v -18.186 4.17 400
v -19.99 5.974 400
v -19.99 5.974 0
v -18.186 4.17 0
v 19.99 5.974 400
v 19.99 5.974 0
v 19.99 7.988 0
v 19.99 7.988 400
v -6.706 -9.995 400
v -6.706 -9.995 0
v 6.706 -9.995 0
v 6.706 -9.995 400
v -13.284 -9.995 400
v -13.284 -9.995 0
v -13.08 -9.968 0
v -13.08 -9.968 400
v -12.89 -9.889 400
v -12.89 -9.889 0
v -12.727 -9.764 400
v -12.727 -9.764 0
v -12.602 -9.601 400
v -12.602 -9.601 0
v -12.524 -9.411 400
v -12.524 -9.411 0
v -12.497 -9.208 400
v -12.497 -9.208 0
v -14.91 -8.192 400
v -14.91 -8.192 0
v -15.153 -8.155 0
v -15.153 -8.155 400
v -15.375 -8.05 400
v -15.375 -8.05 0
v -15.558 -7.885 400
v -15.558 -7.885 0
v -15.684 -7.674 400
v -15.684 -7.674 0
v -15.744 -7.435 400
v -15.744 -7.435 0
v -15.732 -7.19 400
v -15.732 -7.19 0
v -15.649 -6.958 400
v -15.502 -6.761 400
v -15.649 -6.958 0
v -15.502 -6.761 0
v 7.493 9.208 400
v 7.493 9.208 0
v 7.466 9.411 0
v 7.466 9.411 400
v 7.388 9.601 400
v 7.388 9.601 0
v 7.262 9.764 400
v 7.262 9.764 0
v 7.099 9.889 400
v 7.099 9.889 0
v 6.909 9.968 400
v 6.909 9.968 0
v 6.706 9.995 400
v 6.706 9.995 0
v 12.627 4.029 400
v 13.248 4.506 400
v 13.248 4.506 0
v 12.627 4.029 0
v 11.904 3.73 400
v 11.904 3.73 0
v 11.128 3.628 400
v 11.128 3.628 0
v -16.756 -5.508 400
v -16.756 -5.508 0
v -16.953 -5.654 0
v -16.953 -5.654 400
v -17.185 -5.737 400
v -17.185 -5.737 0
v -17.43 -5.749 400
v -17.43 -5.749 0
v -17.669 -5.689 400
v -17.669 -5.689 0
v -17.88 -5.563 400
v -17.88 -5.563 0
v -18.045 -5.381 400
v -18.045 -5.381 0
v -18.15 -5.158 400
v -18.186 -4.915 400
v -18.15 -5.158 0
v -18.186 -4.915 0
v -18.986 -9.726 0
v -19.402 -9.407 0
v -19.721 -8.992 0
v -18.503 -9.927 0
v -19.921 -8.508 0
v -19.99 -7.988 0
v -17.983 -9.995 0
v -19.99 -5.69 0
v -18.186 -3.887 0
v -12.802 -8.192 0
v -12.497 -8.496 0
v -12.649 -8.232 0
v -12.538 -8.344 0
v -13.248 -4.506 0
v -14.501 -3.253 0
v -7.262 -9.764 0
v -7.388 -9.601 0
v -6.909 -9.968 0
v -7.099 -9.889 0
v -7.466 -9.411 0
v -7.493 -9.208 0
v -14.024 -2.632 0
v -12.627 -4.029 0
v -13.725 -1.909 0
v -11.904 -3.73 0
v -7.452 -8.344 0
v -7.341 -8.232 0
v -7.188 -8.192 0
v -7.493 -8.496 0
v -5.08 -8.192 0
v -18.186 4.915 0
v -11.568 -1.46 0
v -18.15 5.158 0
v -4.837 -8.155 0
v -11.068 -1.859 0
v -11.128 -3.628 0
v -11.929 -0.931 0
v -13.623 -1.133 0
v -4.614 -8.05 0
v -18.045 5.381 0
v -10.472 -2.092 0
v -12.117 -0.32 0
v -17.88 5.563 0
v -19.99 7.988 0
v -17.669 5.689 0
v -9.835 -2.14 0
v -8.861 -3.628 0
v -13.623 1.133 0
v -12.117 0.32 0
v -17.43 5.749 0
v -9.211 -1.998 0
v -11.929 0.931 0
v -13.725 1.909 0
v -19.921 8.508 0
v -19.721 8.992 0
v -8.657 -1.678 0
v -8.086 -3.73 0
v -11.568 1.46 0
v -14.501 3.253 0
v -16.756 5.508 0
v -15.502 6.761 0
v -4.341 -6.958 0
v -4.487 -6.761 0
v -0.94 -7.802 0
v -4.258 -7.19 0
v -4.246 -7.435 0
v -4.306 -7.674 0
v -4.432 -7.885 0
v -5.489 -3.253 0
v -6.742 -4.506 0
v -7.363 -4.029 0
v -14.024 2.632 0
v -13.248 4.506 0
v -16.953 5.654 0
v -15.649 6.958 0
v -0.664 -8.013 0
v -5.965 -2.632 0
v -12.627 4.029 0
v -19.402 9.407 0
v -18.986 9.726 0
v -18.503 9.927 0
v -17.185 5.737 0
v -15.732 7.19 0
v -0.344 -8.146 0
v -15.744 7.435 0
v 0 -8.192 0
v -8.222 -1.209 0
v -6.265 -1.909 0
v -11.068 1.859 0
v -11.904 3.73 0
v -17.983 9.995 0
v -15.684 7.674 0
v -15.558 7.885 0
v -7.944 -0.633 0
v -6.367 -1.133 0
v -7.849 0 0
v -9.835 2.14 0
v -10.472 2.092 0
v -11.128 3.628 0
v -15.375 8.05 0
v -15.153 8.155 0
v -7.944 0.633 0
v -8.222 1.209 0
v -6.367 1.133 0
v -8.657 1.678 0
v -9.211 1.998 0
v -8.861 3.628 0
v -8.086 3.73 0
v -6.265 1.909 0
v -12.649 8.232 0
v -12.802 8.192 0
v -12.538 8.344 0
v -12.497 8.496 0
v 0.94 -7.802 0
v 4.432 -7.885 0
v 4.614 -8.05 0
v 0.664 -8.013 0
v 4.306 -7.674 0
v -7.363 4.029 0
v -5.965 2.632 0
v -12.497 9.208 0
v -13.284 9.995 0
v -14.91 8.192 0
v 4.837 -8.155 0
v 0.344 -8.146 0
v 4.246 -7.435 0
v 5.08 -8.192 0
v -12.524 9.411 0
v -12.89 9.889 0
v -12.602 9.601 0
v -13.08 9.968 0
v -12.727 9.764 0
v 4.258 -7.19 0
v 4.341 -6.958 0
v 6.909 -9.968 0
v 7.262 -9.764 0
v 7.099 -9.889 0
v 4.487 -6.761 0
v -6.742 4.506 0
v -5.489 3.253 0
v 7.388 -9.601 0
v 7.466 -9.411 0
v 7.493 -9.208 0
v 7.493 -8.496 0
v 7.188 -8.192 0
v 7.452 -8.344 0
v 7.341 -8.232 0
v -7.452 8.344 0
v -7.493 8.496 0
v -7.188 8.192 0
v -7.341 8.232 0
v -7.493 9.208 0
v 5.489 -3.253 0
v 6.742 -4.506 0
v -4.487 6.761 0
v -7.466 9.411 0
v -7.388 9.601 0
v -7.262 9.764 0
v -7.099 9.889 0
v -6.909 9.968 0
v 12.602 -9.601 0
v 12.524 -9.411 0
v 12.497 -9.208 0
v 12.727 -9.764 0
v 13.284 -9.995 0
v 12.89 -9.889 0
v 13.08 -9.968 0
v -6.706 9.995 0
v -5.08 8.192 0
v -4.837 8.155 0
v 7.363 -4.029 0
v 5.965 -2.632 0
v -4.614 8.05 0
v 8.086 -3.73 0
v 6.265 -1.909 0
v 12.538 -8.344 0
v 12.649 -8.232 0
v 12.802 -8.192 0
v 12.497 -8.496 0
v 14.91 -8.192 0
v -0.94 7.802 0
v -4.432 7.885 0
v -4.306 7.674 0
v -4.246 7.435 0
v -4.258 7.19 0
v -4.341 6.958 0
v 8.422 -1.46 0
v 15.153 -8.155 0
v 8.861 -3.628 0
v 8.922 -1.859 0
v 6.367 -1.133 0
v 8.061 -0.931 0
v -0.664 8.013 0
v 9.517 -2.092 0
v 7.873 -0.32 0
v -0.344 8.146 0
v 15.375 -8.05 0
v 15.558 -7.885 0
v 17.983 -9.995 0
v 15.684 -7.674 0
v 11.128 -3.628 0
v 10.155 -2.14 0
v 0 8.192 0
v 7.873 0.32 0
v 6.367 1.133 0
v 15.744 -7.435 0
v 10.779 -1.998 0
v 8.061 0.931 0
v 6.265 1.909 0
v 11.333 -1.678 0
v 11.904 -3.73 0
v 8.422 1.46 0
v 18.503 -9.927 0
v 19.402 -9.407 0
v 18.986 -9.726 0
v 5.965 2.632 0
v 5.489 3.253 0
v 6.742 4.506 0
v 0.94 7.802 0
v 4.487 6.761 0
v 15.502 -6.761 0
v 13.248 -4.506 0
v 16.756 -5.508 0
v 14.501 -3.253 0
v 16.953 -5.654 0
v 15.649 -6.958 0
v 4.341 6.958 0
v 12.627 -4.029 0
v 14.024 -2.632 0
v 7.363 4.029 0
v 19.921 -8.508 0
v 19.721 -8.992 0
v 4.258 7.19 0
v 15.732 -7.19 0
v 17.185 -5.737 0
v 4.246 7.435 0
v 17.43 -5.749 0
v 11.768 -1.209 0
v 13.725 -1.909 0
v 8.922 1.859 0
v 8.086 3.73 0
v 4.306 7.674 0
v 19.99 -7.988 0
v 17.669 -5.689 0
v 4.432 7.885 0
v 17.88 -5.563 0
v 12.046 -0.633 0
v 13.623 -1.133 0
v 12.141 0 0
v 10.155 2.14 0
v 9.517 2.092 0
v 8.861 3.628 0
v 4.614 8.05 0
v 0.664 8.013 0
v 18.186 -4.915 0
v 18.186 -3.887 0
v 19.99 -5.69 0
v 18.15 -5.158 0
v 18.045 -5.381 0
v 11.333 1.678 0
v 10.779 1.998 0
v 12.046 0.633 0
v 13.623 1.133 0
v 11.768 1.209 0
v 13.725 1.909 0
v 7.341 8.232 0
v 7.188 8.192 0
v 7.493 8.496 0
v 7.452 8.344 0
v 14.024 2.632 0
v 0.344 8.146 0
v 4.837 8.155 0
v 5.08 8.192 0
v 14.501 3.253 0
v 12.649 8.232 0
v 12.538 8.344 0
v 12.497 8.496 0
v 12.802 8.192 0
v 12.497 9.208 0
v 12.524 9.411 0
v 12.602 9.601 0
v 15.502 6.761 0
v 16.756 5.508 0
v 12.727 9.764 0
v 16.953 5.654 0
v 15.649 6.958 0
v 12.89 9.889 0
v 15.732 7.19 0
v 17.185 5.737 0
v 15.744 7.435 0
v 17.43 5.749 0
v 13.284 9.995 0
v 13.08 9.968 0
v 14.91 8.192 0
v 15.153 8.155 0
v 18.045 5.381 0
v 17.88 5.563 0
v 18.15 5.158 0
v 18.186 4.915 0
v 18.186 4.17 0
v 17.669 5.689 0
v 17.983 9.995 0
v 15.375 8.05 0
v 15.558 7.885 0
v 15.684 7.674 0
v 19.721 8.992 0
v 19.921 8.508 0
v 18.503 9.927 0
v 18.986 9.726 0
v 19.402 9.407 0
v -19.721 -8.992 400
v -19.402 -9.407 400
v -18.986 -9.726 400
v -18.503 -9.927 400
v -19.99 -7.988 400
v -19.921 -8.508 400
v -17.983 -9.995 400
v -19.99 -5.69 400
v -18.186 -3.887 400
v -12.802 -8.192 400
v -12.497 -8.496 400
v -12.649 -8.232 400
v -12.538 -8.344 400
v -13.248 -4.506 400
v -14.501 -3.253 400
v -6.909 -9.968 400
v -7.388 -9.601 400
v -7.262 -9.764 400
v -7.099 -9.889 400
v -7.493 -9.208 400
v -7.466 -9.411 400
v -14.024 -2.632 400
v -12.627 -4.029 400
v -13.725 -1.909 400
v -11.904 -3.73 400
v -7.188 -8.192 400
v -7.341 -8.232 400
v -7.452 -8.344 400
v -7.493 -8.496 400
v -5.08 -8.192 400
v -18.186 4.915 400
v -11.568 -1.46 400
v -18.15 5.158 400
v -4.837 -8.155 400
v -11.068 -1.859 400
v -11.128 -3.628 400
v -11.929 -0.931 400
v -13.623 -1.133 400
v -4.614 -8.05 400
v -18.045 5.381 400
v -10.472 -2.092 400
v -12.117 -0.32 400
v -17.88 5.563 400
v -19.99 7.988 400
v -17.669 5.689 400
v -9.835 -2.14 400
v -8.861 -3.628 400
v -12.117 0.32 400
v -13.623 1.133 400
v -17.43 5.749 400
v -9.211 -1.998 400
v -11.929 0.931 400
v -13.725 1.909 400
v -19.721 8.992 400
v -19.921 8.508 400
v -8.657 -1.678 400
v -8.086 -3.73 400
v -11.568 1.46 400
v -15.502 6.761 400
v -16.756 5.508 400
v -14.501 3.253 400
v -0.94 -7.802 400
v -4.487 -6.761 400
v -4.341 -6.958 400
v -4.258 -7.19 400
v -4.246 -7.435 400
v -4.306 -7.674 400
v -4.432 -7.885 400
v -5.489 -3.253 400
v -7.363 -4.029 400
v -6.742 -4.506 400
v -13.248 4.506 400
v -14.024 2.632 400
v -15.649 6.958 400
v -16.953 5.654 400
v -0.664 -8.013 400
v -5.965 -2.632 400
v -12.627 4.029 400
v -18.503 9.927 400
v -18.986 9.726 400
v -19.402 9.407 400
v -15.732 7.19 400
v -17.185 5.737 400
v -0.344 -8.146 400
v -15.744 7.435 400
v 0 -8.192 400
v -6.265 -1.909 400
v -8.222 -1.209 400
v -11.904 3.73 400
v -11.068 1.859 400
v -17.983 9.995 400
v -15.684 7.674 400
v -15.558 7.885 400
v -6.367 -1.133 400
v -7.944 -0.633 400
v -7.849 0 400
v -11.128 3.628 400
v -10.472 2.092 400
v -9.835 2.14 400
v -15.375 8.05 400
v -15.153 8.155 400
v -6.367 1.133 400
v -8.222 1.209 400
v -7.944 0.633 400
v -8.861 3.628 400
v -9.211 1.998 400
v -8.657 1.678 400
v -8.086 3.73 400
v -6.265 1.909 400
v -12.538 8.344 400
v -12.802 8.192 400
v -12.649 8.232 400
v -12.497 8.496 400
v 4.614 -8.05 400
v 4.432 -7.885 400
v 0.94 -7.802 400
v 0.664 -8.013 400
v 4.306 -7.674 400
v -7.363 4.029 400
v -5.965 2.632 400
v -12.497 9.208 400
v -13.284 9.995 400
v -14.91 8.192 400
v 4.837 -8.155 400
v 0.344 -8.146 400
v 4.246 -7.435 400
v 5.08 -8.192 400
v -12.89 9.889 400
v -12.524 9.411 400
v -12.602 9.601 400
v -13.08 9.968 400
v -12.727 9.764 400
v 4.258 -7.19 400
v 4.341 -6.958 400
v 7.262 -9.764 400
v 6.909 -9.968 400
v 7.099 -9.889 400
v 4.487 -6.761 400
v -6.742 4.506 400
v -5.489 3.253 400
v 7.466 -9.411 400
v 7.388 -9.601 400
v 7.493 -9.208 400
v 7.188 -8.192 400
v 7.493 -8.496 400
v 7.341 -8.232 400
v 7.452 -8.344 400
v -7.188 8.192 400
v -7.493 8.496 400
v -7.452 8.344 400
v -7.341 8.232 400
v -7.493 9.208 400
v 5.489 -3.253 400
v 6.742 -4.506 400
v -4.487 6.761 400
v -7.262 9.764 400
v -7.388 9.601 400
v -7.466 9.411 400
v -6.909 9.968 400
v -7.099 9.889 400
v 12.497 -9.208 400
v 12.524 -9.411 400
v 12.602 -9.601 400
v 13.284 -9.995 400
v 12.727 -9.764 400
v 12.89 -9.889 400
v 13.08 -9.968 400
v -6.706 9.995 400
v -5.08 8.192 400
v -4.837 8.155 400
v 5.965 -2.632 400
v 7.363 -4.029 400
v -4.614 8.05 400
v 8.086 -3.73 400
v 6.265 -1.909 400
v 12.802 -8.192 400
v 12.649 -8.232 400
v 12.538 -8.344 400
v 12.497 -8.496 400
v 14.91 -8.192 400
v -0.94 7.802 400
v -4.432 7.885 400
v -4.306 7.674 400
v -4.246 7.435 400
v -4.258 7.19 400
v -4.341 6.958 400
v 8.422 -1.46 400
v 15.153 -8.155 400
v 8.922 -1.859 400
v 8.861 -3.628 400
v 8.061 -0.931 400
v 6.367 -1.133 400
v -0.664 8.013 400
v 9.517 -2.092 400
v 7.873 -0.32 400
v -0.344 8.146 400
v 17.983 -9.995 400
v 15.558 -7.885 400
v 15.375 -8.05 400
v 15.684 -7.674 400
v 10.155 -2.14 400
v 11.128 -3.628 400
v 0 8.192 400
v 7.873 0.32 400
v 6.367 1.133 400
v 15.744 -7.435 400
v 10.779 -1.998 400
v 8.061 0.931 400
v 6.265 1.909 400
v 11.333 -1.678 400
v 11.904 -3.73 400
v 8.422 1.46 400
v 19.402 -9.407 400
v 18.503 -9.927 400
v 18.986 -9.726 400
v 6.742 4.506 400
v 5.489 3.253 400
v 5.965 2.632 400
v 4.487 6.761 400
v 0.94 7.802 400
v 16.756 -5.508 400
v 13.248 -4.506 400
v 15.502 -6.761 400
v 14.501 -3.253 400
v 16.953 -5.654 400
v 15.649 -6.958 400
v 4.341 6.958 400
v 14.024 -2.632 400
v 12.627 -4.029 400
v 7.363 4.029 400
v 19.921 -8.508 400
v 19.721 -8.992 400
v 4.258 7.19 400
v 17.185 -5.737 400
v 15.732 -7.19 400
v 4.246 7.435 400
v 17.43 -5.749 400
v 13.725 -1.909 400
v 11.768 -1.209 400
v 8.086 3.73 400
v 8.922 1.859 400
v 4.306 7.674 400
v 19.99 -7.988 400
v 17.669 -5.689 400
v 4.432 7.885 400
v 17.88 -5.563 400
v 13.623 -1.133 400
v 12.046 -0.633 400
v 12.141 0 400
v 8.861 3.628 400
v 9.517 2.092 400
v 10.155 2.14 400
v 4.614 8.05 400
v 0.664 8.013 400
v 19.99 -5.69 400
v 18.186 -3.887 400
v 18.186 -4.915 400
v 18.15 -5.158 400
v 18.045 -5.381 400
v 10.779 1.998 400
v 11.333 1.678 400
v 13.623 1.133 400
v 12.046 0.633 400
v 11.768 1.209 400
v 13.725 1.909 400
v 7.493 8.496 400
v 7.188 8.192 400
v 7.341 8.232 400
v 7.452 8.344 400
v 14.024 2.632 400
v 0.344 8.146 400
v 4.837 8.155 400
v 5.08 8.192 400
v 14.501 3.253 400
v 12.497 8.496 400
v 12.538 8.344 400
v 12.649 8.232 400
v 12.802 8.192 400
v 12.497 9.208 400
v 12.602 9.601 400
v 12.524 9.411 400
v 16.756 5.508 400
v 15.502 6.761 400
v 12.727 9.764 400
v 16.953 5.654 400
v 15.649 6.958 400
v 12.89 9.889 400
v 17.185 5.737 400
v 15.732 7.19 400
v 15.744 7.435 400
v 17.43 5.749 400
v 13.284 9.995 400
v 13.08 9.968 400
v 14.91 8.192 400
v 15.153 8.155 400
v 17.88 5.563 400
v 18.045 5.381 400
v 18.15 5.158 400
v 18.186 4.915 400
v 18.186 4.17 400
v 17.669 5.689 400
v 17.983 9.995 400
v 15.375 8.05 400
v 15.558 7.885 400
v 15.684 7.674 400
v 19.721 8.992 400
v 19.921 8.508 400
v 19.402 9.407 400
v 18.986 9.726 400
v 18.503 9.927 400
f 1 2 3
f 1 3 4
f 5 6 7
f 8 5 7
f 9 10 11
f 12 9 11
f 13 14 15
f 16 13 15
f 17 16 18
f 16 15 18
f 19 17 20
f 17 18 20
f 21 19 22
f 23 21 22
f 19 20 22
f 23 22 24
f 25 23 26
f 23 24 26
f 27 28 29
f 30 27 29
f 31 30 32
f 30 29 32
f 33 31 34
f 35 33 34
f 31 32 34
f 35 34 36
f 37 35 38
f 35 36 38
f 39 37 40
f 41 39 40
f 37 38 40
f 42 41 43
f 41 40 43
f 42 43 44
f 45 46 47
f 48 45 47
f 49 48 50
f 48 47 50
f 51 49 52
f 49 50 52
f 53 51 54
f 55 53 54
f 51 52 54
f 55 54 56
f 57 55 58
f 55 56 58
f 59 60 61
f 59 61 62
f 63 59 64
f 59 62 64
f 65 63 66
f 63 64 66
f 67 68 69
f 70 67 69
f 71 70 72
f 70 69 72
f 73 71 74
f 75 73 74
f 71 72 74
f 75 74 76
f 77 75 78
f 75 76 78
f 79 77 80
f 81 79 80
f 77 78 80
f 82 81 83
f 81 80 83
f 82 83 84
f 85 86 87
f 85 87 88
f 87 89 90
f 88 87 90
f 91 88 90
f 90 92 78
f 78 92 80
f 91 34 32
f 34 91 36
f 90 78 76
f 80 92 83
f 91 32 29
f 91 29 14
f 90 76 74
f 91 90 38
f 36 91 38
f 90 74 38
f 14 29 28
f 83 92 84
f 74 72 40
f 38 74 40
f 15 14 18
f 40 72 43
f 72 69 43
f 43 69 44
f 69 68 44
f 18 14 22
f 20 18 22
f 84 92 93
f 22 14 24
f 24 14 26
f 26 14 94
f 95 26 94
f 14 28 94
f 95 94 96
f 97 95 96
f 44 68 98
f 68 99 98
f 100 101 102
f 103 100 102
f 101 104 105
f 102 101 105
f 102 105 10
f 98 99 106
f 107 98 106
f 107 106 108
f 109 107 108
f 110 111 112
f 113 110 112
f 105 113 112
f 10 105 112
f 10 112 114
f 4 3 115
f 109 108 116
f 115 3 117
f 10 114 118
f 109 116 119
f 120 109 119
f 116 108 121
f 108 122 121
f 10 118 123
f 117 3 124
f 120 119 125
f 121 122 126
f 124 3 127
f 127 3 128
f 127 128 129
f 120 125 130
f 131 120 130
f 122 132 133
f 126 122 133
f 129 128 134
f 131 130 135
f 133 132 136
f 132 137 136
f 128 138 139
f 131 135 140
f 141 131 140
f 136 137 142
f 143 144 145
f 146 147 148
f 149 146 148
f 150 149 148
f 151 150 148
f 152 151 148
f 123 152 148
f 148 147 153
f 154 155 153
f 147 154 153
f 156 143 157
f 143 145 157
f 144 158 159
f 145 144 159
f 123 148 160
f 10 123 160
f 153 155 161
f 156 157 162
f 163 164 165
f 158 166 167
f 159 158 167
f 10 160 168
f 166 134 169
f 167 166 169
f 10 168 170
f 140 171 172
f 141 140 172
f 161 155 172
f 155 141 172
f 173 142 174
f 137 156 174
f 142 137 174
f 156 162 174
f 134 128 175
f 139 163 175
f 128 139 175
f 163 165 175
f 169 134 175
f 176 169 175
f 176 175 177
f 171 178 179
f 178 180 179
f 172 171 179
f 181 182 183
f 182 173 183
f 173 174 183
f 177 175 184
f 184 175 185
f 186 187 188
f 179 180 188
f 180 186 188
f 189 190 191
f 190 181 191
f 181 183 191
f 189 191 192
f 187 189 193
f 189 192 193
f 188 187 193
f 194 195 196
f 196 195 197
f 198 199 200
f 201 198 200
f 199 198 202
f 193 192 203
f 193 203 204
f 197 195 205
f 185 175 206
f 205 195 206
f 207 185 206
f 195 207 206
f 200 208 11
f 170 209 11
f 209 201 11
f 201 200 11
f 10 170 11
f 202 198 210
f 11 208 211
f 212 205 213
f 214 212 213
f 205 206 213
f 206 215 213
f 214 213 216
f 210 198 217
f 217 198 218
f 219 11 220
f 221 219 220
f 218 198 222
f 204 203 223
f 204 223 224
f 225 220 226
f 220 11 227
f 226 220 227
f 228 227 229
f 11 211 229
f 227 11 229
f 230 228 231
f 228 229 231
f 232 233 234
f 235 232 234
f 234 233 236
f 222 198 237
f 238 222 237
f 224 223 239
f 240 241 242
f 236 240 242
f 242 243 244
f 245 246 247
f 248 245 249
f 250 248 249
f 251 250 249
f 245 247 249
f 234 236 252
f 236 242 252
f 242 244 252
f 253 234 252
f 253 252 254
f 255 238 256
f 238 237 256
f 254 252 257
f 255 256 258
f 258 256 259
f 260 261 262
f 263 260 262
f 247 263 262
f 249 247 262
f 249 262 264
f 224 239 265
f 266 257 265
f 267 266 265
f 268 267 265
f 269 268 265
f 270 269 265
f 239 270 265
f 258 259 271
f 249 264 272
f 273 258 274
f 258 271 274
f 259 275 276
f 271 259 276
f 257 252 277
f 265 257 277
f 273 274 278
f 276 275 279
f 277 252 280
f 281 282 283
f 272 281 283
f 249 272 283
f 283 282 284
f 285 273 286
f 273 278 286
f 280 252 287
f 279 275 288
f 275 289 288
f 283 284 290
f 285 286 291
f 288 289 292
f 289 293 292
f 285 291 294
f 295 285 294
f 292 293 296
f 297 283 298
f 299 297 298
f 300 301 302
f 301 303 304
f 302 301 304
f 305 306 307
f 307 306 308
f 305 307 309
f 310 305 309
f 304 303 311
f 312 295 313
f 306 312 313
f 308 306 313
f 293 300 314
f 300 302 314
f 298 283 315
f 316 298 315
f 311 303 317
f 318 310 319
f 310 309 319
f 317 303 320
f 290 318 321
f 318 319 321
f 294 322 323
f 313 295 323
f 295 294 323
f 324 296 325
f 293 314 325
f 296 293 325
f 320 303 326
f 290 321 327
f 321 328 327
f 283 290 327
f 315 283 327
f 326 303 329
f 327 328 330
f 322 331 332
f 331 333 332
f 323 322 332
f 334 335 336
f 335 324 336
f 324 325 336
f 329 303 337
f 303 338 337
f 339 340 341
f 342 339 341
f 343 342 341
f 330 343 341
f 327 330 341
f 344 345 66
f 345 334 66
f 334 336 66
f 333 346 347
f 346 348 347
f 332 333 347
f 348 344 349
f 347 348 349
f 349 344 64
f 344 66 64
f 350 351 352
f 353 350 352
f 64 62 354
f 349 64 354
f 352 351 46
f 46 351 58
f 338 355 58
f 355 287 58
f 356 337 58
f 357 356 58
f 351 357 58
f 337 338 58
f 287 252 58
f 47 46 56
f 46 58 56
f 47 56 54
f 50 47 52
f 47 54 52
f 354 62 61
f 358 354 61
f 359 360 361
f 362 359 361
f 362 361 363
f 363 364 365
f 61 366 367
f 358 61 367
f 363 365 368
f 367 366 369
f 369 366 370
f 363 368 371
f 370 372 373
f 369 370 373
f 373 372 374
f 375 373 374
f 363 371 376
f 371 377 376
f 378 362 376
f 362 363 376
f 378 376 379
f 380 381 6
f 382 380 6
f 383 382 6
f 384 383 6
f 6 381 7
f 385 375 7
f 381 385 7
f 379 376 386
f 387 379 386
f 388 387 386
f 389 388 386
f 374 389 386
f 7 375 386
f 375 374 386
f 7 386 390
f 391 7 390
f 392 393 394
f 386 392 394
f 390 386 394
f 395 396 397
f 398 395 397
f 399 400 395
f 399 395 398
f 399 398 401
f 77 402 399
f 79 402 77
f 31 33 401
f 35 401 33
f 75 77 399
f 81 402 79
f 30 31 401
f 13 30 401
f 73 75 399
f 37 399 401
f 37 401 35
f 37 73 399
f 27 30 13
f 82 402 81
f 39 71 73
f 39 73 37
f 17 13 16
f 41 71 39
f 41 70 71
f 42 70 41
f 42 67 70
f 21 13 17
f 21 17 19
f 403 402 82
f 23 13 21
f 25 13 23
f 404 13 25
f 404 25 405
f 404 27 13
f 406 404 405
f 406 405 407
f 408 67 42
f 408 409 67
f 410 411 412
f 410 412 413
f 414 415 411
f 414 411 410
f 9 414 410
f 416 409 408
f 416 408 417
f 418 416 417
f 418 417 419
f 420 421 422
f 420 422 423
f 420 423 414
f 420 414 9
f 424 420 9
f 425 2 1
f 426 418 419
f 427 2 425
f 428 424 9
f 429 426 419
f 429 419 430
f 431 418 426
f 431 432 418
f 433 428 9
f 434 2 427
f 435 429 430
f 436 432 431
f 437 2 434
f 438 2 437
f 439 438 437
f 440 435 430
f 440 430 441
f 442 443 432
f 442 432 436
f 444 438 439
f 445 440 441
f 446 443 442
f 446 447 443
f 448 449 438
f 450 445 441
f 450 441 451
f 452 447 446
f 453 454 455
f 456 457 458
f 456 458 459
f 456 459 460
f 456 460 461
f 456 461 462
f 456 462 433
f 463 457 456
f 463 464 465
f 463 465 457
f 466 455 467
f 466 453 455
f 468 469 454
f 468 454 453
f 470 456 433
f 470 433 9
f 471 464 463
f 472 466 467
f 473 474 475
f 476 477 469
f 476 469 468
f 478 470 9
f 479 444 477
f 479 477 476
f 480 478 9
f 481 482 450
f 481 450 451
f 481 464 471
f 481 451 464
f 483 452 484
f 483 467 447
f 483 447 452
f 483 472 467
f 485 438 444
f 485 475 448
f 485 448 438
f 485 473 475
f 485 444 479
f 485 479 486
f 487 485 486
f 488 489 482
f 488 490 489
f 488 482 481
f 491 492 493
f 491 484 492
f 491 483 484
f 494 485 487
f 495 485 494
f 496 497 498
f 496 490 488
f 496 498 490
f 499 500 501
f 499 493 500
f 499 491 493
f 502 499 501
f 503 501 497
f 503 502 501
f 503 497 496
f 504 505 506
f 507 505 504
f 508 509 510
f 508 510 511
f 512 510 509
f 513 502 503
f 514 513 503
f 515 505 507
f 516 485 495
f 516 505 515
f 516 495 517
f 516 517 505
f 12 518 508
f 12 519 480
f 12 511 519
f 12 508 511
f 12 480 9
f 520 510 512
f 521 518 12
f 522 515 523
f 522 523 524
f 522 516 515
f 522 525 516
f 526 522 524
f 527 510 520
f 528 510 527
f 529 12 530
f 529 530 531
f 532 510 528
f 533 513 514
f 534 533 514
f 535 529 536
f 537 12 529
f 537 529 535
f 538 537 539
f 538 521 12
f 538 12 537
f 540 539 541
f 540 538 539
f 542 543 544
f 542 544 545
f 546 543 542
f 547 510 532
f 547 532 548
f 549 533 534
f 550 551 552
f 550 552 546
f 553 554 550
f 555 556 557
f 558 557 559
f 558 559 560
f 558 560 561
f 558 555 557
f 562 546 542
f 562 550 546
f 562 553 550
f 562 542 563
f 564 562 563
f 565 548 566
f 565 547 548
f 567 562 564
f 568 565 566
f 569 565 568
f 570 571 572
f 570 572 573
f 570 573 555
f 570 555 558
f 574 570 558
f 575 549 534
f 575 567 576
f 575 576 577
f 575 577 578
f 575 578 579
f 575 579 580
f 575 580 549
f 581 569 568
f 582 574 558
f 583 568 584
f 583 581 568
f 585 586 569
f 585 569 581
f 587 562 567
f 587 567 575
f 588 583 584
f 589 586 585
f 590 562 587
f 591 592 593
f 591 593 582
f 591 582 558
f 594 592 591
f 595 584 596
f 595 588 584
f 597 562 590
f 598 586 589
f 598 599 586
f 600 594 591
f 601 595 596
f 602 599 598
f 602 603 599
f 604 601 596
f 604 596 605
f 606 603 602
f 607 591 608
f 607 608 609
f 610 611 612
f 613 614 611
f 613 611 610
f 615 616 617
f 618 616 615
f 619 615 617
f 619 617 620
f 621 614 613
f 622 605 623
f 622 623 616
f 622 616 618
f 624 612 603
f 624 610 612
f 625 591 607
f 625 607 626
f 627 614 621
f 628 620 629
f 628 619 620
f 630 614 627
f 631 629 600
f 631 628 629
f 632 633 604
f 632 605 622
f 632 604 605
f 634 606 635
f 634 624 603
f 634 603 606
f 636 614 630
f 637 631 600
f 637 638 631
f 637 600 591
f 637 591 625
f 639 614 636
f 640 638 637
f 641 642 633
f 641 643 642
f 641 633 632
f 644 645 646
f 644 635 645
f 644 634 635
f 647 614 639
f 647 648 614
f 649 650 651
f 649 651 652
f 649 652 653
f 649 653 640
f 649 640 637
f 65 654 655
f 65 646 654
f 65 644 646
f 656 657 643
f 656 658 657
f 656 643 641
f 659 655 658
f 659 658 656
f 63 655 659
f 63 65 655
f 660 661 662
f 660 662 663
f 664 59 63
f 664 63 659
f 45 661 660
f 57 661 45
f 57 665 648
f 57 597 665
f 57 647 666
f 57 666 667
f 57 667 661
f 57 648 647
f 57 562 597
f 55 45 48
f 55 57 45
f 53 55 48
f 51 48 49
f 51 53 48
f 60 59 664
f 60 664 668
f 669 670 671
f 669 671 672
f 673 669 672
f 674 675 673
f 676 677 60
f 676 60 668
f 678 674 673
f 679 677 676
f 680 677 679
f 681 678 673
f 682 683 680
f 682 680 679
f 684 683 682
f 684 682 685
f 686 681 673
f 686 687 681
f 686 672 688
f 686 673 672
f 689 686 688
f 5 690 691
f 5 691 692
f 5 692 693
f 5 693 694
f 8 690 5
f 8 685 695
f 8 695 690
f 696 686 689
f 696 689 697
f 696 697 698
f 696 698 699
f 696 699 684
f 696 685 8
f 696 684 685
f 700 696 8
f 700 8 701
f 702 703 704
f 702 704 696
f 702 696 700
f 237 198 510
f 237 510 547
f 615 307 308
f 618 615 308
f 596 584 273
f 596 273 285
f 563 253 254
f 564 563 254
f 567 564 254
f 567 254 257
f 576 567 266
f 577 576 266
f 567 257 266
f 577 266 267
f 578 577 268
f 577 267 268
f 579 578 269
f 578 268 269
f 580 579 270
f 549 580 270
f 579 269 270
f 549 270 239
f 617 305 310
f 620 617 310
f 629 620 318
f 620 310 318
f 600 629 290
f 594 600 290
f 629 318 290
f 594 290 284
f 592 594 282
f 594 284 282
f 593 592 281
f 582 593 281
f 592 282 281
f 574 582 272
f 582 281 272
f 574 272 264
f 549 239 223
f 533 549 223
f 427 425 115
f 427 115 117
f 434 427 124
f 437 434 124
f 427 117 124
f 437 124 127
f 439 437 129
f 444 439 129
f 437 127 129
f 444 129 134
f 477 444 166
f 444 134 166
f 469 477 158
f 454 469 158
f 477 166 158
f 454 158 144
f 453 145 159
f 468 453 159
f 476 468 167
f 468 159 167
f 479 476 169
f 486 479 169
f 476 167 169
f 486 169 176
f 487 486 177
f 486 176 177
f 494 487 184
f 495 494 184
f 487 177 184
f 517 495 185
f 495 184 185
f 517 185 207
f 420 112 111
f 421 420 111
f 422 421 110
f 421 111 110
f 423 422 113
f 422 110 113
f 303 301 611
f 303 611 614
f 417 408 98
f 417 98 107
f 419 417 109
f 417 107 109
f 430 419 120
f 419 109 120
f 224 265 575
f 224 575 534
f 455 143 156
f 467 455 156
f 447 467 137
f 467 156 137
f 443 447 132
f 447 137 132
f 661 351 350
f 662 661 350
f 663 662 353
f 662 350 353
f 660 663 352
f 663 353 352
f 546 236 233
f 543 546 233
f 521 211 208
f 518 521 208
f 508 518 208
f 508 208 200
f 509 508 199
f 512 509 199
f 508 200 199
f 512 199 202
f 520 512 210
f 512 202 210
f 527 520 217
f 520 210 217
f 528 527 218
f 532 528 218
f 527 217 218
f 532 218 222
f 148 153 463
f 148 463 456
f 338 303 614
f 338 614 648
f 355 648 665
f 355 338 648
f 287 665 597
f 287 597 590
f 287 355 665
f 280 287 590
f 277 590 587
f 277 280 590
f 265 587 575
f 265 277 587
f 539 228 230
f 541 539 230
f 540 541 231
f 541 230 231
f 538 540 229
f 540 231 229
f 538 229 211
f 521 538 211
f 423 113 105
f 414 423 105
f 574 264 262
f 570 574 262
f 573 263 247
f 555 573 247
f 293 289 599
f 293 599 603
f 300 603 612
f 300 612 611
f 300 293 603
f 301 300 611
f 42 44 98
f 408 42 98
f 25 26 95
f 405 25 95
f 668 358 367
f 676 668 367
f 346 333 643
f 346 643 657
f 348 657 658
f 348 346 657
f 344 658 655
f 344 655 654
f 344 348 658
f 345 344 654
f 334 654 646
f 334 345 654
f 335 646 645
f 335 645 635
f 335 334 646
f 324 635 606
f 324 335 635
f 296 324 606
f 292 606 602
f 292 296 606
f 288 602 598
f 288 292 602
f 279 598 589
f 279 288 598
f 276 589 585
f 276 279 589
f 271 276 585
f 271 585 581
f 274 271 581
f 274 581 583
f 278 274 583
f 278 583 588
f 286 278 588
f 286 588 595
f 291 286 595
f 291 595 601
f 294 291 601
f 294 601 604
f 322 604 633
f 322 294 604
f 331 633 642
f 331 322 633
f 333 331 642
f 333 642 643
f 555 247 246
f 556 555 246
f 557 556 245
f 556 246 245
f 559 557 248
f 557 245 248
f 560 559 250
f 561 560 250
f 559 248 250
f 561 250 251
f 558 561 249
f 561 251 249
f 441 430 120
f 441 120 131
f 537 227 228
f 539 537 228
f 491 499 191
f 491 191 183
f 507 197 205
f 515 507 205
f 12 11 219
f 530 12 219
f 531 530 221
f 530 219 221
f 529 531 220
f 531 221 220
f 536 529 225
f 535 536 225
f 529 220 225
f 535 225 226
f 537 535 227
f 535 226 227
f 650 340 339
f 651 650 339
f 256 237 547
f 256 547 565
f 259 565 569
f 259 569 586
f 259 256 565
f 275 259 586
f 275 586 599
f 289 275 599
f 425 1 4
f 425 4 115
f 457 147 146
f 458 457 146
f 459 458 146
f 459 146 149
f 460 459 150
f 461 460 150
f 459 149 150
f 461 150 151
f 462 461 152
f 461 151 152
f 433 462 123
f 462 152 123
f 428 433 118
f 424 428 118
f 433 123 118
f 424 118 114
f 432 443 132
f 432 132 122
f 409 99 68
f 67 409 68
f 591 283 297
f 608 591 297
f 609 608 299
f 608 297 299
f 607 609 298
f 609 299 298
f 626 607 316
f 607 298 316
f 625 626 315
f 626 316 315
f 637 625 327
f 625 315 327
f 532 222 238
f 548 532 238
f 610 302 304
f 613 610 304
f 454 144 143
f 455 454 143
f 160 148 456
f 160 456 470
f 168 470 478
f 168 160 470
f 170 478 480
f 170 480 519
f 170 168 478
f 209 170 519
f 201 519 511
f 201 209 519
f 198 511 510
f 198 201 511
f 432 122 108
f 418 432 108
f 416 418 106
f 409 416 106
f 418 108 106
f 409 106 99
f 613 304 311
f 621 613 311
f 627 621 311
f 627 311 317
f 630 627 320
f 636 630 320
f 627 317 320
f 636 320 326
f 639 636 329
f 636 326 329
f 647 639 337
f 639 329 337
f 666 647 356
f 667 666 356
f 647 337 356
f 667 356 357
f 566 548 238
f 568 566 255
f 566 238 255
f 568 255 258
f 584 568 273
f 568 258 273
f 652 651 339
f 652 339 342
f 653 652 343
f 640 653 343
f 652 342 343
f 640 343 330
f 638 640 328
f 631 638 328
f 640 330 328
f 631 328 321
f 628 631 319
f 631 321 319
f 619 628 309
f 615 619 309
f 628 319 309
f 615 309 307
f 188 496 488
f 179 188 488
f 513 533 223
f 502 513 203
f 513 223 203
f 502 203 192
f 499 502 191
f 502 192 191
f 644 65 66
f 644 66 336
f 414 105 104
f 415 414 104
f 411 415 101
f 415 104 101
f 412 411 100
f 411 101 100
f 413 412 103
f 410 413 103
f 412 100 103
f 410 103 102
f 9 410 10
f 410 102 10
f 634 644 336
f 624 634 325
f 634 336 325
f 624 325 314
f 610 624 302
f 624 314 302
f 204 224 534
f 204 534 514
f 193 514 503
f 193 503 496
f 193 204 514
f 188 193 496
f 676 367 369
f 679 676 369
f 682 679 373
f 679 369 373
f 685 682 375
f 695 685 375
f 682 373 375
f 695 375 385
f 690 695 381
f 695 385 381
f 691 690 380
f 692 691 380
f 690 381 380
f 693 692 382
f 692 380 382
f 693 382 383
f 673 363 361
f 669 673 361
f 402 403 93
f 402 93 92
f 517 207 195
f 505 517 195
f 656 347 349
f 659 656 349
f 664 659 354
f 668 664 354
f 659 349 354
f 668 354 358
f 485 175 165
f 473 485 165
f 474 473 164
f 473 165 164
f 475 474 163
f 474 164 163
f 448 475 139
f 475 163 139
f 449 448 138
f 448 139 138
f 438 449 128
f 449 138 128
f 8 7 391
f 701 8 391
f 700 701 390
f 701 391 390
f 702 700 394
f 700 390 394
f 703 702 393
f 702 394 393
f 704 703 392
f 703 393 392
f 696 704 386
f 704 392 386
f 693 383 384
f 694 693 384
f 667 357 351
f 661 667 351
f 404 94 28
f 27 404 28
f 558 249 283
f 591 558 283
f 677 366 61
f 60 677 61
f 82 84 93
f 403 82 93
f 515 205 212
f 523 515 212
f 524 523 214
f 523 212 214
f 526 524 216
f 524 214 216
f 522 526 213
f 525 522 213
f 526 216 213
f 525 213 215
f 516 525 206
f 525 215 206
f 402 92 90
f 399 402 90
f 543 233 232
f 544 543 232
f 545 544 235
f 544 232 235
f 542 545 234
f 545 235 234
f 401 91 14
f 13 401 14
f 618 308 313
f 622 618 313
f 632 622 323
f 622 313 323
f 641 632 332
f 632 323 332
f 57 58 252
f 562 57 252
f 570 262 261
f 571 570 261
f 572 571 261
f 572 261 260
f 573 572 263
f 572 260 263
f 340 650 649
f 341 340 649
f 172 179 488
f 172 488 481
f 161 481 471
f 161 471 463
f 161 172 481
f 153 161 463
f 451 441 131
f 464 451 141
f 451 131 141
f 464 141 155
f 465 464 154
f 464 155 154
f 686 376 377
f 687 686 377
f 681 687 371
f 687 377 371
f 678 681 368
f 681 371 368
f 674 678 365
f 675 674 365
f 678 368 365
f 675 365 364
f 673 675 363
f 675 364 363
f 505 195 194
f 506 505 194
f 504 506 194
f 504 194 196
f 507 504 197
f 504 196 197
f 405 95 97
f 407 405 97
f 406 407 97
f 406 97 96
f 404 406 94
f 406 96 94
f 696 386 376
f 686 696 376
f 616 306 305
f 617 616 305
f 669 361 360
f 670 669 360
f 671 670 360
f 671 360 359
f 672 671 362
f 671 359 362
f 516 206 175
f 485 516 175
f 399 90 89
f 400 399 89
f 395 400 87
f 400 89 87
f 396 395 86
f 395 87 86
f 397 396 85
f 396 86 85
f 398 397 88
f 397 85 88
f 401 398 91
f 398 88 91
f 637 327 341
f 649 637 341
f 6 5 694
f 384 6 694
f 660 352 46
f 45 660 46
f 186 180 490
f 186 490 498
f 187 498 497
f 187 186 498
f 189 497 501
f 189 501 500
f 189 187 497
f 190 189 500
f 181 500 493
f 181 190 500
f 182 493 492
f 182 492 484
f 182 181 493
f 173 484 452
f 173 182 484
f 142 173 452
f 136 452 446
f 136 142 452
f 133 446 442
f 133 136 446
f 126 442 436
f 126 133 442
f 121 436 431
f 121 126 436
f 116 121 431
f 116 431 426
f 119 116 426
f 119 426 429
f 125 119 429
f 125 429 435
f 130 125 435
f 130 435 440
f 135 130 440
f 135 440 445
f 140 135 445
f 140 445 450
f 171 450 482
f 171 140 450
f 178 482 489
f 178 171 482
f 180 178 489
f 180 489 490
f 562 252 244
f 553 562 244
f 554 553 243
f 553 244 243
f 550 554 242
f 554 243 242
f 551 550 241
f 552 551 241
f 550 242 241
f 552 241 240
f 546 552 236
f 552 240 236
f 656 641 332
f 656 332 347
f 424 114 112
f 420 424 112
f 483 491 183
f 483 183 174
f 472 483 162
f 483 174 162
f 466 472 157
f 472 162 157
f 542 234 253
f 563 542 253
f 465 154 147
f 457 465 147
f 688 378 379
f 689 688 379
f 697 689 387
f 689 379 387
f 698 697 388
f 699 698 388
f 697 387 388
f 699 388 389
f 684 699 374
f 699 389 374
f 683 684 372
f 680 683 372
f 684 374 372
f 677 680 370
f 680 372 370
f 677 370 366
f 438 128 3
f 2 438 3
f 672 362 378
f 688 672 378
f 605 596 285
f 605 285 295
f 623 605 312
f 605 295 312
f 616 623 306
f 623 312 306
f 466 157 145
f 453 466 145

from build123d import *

# Parameters (mm, degrees)
SKETCH1_R           = 2.1463
BOSS_EXTRUDE1_DEPTH = 400
CUT_EXTRUDE1_DEPTH  = 401


with BuildPart() as part:
    # Sketch1 → Boss-Extrude1 (new body)
    with BuildSketch(Plane.XY):
        with BuildLine():
            Line((-19.9898, 7.9883), (-19.9898, 3.2893))
            ThreePointArc((-19.9898, 3.2893), (-19.75917588, 2.73252412), (-19.2024, 2.5019))
            Line((-19.2024, 2.5019), (-18.4912, 2.5019))
            ThreePointArc((-18.4912, 2.5019), (-18.275673853, 2.591173853), (-18.1864, 2.8067))
            Line((-18.1864, 2.8067), (-18.1864, 4.9149))
            ThreePointArc((-18.1864, 4.9149), (-17.668965253, 5.689295824), (-16.755503096, 5.507596904))
            Line((-16.755503096, 5.507596904), (-14.500665747, 3.252759555))
            ThreePointArc((-14.500665747, 3.252759555), (-13.850954457, 2.280397894), (-13.622806192, 1.133419111))
            Line((-13.622806192, 1.133419111), (-13.622806192, -1.133419111))
            ThreePointArc((-13.622806192, -1.133419111), (-13.850954457, -2.280397894), (-14.500665747, -3.252759555))
            Line((-14.500665747, -3.252759555), (-16.755503096, -5.507596904))
            ThreePointArc((-16.755503096, -5.507596904), (-17.668965253, -5.689295824), (-18.1864, -4.9149))
            Line((-18.1864, -4.9149), (-18.1864, -2.8067))
            ThreePointArc((-18.1864, -2.8067), (-18.275673853, -2.591173853), (-18.4912, -2.5019))
            Line((-18.4912, -2.5019), (-19.2024, -2.5019))
            ThreePointArc((-19.2024, -2.5019), (-19.75917588, -2.73252412), (-19.9898, -3.2893))
            Line((-19.9898, -3.2893), (-19.9898, -7.9883))
            ThreePointArc((-19.9898, -7.9883), (-19.402080467, -9.407180467), (-17.9832, -9.9949))
            Line((-17.9832, -9.9949), (-13.2842, -9.9949))
            ThreePointArc((-13.2842, -9.9949), (-12.72742412, -9.76427588), (-12.4968, -9.2075))
            Line((-12.4968, -9.2075), (-12.4968, -8.4963))
            ThreePointArc((-12.4968, -8.4963), (-12.586073853, -8.280773853), (-12.8016, -8.1915))
            Line((-12.8016, -8.1915), (-14.9098, -8.1915))
            ThreePointArc((-14.9098, -8.1915), (-15.684195824, -7.674065253), (-15.502496904, -6.760603096))
            Line((-15.502496904, -6.760603096), (-13.247659555, -4.505765747))
            ThreePointArc((-13.247659555, -4.505765747), (-12.275297894, -3.856054457), (-11.128319111, -3.627906192))
            Line((-11.128319111, -3.627906192), (-8.861480889, -3.627906192))
            ThreePointArc((-8.861480889, -3.627906192), (-7.714502106, -3.856054457), (-6.742140445, -4.505765747))
            Line((-6.742140445, -4.505765747), (-4.487303096, -6.760603096))
            ThreePointArc((-4.487303096, -6.760603096), (-4.305604176, -7.674065253), (-5.08, -8.1915))
            Line((-5.08, -8.1915), (-7.1882, -8.1915))
            ThreePointArc((-7.1882, -8.1915), (-7.403726147, -8.280773853), (-7.493, -8.4963))
            Line((-7.493, -8.4963), (-7.493, -9.2075))
            ThreePointArc((-7.493, -9.2075), (-7.26237588, -9.76427588), (-6.7056, -9.9949))
            Line((-6.7056, -9.9949), (0, -9.9949))
            Line((0, -9.9949), (6.7056, -9.9949))
            ThreePointArc((6.7056, -9.9949), (7.26237588, -9.76427588), (7.493, -9.2075))
            Line((7.493, -9.2075), (7.493, -8.4963))
            ThreePointArc((7.493, -8.4963), (7.403726147, -8.280773853), (7.1882, -8.1915))
            Line((7.1882, -8.1915), (5.08, -8.1915))
            ThreePointArc((5.08, -8.1915), (4.305604176, -7.674065253), (4.487303096, -6.760603096))
            Line((4.487303096, -6.760603096), (6.742140445, -4.505765747))
            ThreePointArc((6.742140445, -4.505765747), (7.714502106, -3.856054457), (8.861480889, -3.627906192))
            Line((8.861480889, -3.627906192), (11.128319111, -3.627906192))
            ThreePointArc((11.128319111, -3.627906192), (12.275297894, -3.856054457), (13.247659555, -4.505765747))
            Line((13.247659555, -4.505765747), (15.502496904, -6.760603096))
            ThreePointArc((15.502496904, -6.760603096), (15.684195824, -7.674065253), (14.9098, -8.1915))
            Line((14.9098, -8.1915), (12.8016, -8.1915))
            ThreePointArc((12.8016, -8.1915), (12.586073853, -8.280773853), (12.4968, -8.4963))
            Line((12.4968, -8.4963), (12.4968, -9.2075))
            ThreePointArc((12.4968, -9.2075), (12.72742412, -9.76427588), (13.2842, -9.9949))
            Line((13.2842, -9.9949), (17.9832, -9.9949))
            ThreePointArc((17.9832, -9.9949), (19.402080467, -9.407180467), (19.9898, -7.9883))
            Line((19.9898, -7.9883), (19.9898, -3.2893))
            ThreePointArc((19.9898, -3.2893), (19.75917588, -2.73252412), (19.2024, -2.5019))
            Line((19.2024, -2.5019), (18.4912, -2.5019))
            ThreePointArc((18.4912, -2.5019), (18.275673853, -2.591173853), (18.1864, -2.8067))
            Line((18.1864, -2.8067), (18.1864, -4.9149))
            ThreePointArc((18.1864, -4.9149), (17.668965253, -5.689295824), (16.755503096, -5.507596904))
            Line((16.755503096, -5.507596904), (14.500665747, -3.252759555))
            ThreePointArc((14.500665747, -3.252759555), (13.850954457, -2.280397894), (13.622806192, -1.133419111))
            Line((13.622806192, -1.133419111), (13.622806192, 1.133419111))
            ThreePointArc((13.622806192, 1.133419111), (13.850954457, 2.280397894), (14.500665747, 3.252759555))
            Line((14.500665747, 3.252759555), (16.755503096, 5.507596904))
            ThreePointArc((16.755503096, 5.507596904), (17.668965253, 5.689295824), (18.1864, 4.9149))
            Line((18.1864, 4.9149), (18.1864, 2.8067))
            ThreePointArc((18.1864, 2.8067), (18.275673853, 2.591173853), (18.4912, 2.5019))
            Line((18.4912, 2.5019), (19.2024, 2.5019))
            ThreePointArc((19.2024, 2.5019), (19.75917588, 2.73252412), (19.9898, 3.2893))
            Line((19.9898, 3.2893), (19.9898, 7.9883))
            ThreePointArc((19.9898, 7.9883), (19.402080467, 9.407180467), (17.9832, 9.9949))
            Line((17.9832, 9.9949), (13.2842, 9.9949))
            ThreePointArc((13.2842, 9.9949), (12.72742412, 9.76427588), (12.4968, 9.2075))
            Line((12.4968, 9.2075), (12.4968, 8.4963))
            ThreePointArc((12.4968, 8.4963), (12.586073853, 8.280773853), (12.8016, 8.1915))
            Line((12.8016, 8.1915), (14.9098, 8.1915))
            ThreePointArc((14.9098, 8.1915), (15.684195824, 7.674065253), (15.502496904, 6.760603096))
            Line((15.502496904, 6.760603096), (13.247659555, 4.505765747))
            ThreePointArc((13.247659555, 4.505765747), (12.275297894, 3.856054457), (11.128319111, 3.627906192))
            Line((11.128319111, 3.627906192), (8.861480889, 3.627906192))
            ThreePointArc((8.861480889, 3.627906192), (7.714502106, 3.856054457), (6.742140445, 4.505765747))
            Line((6.742140445, 4.505765747), (4.487303096, 6.760603096))
            ThreePointArc((4.487303096, 6.760603096), (4.305604176, 7.674065253), (5.08, 8.1915))
            Line((5.08, 8.1915), (7.1882, 8.1915))
            ThreePointArc((7.1882, 8.1915), (7.403726147, 8.280773853), (7.493, 8.4963))
            Line((7.493, 8.4963), (7.493, 9.2075))
            ThreePointArc((7.493, 9.2075), (7.26237588, 9.76427588), (6.7056, 9.9949))
            Line((6.7056, 9.9949), (0, 9.9949))
            Line((0, 9.9949), (-6.7056, 9.9949))
            ThreePointArc((-6.7056, 9.9949), (-7.26237588, 9.76427588), (-7.493, 9.2075))
            Line((-7.493, 9.2075), (-7.493, 8.4963))
            ThreePointArc((-7.493, 8.4963), (-7.403726147, 8.280773853), (-7.1882, 8.1915))
            Line((-7.1882, 8.1915), (-5.08, 8.1915))
            ThreePointArc((-5.08, 8.1915), (-4.305604176, 7.674065253), (-4.487303096, 6.760603096))
            Line((-4.487303096, 6.760603096), (-6.742140445, 4.505765747))
            ThreePointArc((-6.742140445, 4.505765747), (-7.714502106, 3.856054457), (-8.861480889, 3.627906192))
            Line((-8.861480889, 3.627906192), (-11.128319111, 3.627906192))
            ThreePointArc((-11.128319111, 3.627906192), (-12.275297894, 3.856054457), (-13.247659555, 4.505765747))
            Line((-13.247659555, 4.505765747), (-15.502496904, 6.760603096))
            ThreePointArc((-15.502496904, 6.760603096), (-15.684195824, 7.674065253), (-14.9098, 8.1915))
            Line((-14.9098, 8.1915), (-12.8016, 8.1915))
            ThreePointArc((-12.8016, 8.1915), (-12.586073853, 8.280773853), (-12.4968, 8.4963))
            Line((-12.4968, 8.4963), (-12.4968, 9.2075))
            ThreePointArc((-12.4968, 9.2075), (-12.72742412, 9.76427588), (-13.2842, 9.9949))
            Line((-13.2842, 9.9949), (-17.9832, 9.9949))
            ThreePointArc((-17.9832, 9.9949), (-19.402080467, 9.407180467), (-19.9898, 7.9883))
        make_face()
        with Locations((-9.9949, 0)):
            Circle(SKETCH1_R, mode=Mode.SUBTRACT)
        with Locations((9.9949, 0)):
            Circle(SKETCH1_R, mode=Mode.SUBTRACT)
        with BuildLine():
            Line((-6.366993808, 1.133419111), (-6.366993808, -1.133419111))
            ThreePointArc((-6.366993808, -1.133419111), (-6.138845543, -2.280397894), (-5.489134253, -3.252759555))
            Line((-5.489134253, -3.252759555), (-0.939581002, -7.802312806))
            ThreePointArc((-0.939581002, -7.802312806), (0, -8.1915), (0.939581002, -7.802312806))
            Line((0.939581002, -7.802312806), (5.489134253, -3.252759555))
            ThreePointArc((5.489134253, -3.252759555), (6.138845543, -2.280397894), (6.366993808, -1.133419111))
            Line((6.366993808, -1.133419111), (6.366993808, 1.133419111))
            ThreePointArc((6.366993808, 1.133419111), (6.138845543, 2.280397894), (5.489134253, 3.252759555))
            Line((5.489134253, 3.252759555), (0.939581002, 7.802312806))
            ThreePointArc((0.939581002, 7.802312806), (0, 8.1915), (-0.939581002, 7.802312806))
            Line((-0.939581002, 7.802312806), (-5.489134253, 3.252759555))
            ThreePointArc((-5.489134253, 3.252759555), (-6.138845543, 2.280397894), (-6.366993808, 1.133419111))
        make_face(mode=Mode.SUBTRACT)
    extrude(amount=BOSS_EXTRUDE1_DEPTH)

    # Sketch2 → Cut-Extrude1 (cut, through all)
    with BuildSketch(Plane.XY.offset(400)):
        Polygon((-20.360851008, 6.344750297), (-17.157785984, 3.141685274), (-17.157785984, -2.858314726), (-20.360851008, -6.06137975), align=None)
        Polygon((17.157785984, -2.858314726), (20.360851008, -6.06137975), (20.360851008, 6.344750297), (17.157785984, 3.141685274), align=None)
    extrude(amount=-CUT_EXTRUDE1_DEPTH, mode=Mode.SUBTRACT)


solid = part.part
